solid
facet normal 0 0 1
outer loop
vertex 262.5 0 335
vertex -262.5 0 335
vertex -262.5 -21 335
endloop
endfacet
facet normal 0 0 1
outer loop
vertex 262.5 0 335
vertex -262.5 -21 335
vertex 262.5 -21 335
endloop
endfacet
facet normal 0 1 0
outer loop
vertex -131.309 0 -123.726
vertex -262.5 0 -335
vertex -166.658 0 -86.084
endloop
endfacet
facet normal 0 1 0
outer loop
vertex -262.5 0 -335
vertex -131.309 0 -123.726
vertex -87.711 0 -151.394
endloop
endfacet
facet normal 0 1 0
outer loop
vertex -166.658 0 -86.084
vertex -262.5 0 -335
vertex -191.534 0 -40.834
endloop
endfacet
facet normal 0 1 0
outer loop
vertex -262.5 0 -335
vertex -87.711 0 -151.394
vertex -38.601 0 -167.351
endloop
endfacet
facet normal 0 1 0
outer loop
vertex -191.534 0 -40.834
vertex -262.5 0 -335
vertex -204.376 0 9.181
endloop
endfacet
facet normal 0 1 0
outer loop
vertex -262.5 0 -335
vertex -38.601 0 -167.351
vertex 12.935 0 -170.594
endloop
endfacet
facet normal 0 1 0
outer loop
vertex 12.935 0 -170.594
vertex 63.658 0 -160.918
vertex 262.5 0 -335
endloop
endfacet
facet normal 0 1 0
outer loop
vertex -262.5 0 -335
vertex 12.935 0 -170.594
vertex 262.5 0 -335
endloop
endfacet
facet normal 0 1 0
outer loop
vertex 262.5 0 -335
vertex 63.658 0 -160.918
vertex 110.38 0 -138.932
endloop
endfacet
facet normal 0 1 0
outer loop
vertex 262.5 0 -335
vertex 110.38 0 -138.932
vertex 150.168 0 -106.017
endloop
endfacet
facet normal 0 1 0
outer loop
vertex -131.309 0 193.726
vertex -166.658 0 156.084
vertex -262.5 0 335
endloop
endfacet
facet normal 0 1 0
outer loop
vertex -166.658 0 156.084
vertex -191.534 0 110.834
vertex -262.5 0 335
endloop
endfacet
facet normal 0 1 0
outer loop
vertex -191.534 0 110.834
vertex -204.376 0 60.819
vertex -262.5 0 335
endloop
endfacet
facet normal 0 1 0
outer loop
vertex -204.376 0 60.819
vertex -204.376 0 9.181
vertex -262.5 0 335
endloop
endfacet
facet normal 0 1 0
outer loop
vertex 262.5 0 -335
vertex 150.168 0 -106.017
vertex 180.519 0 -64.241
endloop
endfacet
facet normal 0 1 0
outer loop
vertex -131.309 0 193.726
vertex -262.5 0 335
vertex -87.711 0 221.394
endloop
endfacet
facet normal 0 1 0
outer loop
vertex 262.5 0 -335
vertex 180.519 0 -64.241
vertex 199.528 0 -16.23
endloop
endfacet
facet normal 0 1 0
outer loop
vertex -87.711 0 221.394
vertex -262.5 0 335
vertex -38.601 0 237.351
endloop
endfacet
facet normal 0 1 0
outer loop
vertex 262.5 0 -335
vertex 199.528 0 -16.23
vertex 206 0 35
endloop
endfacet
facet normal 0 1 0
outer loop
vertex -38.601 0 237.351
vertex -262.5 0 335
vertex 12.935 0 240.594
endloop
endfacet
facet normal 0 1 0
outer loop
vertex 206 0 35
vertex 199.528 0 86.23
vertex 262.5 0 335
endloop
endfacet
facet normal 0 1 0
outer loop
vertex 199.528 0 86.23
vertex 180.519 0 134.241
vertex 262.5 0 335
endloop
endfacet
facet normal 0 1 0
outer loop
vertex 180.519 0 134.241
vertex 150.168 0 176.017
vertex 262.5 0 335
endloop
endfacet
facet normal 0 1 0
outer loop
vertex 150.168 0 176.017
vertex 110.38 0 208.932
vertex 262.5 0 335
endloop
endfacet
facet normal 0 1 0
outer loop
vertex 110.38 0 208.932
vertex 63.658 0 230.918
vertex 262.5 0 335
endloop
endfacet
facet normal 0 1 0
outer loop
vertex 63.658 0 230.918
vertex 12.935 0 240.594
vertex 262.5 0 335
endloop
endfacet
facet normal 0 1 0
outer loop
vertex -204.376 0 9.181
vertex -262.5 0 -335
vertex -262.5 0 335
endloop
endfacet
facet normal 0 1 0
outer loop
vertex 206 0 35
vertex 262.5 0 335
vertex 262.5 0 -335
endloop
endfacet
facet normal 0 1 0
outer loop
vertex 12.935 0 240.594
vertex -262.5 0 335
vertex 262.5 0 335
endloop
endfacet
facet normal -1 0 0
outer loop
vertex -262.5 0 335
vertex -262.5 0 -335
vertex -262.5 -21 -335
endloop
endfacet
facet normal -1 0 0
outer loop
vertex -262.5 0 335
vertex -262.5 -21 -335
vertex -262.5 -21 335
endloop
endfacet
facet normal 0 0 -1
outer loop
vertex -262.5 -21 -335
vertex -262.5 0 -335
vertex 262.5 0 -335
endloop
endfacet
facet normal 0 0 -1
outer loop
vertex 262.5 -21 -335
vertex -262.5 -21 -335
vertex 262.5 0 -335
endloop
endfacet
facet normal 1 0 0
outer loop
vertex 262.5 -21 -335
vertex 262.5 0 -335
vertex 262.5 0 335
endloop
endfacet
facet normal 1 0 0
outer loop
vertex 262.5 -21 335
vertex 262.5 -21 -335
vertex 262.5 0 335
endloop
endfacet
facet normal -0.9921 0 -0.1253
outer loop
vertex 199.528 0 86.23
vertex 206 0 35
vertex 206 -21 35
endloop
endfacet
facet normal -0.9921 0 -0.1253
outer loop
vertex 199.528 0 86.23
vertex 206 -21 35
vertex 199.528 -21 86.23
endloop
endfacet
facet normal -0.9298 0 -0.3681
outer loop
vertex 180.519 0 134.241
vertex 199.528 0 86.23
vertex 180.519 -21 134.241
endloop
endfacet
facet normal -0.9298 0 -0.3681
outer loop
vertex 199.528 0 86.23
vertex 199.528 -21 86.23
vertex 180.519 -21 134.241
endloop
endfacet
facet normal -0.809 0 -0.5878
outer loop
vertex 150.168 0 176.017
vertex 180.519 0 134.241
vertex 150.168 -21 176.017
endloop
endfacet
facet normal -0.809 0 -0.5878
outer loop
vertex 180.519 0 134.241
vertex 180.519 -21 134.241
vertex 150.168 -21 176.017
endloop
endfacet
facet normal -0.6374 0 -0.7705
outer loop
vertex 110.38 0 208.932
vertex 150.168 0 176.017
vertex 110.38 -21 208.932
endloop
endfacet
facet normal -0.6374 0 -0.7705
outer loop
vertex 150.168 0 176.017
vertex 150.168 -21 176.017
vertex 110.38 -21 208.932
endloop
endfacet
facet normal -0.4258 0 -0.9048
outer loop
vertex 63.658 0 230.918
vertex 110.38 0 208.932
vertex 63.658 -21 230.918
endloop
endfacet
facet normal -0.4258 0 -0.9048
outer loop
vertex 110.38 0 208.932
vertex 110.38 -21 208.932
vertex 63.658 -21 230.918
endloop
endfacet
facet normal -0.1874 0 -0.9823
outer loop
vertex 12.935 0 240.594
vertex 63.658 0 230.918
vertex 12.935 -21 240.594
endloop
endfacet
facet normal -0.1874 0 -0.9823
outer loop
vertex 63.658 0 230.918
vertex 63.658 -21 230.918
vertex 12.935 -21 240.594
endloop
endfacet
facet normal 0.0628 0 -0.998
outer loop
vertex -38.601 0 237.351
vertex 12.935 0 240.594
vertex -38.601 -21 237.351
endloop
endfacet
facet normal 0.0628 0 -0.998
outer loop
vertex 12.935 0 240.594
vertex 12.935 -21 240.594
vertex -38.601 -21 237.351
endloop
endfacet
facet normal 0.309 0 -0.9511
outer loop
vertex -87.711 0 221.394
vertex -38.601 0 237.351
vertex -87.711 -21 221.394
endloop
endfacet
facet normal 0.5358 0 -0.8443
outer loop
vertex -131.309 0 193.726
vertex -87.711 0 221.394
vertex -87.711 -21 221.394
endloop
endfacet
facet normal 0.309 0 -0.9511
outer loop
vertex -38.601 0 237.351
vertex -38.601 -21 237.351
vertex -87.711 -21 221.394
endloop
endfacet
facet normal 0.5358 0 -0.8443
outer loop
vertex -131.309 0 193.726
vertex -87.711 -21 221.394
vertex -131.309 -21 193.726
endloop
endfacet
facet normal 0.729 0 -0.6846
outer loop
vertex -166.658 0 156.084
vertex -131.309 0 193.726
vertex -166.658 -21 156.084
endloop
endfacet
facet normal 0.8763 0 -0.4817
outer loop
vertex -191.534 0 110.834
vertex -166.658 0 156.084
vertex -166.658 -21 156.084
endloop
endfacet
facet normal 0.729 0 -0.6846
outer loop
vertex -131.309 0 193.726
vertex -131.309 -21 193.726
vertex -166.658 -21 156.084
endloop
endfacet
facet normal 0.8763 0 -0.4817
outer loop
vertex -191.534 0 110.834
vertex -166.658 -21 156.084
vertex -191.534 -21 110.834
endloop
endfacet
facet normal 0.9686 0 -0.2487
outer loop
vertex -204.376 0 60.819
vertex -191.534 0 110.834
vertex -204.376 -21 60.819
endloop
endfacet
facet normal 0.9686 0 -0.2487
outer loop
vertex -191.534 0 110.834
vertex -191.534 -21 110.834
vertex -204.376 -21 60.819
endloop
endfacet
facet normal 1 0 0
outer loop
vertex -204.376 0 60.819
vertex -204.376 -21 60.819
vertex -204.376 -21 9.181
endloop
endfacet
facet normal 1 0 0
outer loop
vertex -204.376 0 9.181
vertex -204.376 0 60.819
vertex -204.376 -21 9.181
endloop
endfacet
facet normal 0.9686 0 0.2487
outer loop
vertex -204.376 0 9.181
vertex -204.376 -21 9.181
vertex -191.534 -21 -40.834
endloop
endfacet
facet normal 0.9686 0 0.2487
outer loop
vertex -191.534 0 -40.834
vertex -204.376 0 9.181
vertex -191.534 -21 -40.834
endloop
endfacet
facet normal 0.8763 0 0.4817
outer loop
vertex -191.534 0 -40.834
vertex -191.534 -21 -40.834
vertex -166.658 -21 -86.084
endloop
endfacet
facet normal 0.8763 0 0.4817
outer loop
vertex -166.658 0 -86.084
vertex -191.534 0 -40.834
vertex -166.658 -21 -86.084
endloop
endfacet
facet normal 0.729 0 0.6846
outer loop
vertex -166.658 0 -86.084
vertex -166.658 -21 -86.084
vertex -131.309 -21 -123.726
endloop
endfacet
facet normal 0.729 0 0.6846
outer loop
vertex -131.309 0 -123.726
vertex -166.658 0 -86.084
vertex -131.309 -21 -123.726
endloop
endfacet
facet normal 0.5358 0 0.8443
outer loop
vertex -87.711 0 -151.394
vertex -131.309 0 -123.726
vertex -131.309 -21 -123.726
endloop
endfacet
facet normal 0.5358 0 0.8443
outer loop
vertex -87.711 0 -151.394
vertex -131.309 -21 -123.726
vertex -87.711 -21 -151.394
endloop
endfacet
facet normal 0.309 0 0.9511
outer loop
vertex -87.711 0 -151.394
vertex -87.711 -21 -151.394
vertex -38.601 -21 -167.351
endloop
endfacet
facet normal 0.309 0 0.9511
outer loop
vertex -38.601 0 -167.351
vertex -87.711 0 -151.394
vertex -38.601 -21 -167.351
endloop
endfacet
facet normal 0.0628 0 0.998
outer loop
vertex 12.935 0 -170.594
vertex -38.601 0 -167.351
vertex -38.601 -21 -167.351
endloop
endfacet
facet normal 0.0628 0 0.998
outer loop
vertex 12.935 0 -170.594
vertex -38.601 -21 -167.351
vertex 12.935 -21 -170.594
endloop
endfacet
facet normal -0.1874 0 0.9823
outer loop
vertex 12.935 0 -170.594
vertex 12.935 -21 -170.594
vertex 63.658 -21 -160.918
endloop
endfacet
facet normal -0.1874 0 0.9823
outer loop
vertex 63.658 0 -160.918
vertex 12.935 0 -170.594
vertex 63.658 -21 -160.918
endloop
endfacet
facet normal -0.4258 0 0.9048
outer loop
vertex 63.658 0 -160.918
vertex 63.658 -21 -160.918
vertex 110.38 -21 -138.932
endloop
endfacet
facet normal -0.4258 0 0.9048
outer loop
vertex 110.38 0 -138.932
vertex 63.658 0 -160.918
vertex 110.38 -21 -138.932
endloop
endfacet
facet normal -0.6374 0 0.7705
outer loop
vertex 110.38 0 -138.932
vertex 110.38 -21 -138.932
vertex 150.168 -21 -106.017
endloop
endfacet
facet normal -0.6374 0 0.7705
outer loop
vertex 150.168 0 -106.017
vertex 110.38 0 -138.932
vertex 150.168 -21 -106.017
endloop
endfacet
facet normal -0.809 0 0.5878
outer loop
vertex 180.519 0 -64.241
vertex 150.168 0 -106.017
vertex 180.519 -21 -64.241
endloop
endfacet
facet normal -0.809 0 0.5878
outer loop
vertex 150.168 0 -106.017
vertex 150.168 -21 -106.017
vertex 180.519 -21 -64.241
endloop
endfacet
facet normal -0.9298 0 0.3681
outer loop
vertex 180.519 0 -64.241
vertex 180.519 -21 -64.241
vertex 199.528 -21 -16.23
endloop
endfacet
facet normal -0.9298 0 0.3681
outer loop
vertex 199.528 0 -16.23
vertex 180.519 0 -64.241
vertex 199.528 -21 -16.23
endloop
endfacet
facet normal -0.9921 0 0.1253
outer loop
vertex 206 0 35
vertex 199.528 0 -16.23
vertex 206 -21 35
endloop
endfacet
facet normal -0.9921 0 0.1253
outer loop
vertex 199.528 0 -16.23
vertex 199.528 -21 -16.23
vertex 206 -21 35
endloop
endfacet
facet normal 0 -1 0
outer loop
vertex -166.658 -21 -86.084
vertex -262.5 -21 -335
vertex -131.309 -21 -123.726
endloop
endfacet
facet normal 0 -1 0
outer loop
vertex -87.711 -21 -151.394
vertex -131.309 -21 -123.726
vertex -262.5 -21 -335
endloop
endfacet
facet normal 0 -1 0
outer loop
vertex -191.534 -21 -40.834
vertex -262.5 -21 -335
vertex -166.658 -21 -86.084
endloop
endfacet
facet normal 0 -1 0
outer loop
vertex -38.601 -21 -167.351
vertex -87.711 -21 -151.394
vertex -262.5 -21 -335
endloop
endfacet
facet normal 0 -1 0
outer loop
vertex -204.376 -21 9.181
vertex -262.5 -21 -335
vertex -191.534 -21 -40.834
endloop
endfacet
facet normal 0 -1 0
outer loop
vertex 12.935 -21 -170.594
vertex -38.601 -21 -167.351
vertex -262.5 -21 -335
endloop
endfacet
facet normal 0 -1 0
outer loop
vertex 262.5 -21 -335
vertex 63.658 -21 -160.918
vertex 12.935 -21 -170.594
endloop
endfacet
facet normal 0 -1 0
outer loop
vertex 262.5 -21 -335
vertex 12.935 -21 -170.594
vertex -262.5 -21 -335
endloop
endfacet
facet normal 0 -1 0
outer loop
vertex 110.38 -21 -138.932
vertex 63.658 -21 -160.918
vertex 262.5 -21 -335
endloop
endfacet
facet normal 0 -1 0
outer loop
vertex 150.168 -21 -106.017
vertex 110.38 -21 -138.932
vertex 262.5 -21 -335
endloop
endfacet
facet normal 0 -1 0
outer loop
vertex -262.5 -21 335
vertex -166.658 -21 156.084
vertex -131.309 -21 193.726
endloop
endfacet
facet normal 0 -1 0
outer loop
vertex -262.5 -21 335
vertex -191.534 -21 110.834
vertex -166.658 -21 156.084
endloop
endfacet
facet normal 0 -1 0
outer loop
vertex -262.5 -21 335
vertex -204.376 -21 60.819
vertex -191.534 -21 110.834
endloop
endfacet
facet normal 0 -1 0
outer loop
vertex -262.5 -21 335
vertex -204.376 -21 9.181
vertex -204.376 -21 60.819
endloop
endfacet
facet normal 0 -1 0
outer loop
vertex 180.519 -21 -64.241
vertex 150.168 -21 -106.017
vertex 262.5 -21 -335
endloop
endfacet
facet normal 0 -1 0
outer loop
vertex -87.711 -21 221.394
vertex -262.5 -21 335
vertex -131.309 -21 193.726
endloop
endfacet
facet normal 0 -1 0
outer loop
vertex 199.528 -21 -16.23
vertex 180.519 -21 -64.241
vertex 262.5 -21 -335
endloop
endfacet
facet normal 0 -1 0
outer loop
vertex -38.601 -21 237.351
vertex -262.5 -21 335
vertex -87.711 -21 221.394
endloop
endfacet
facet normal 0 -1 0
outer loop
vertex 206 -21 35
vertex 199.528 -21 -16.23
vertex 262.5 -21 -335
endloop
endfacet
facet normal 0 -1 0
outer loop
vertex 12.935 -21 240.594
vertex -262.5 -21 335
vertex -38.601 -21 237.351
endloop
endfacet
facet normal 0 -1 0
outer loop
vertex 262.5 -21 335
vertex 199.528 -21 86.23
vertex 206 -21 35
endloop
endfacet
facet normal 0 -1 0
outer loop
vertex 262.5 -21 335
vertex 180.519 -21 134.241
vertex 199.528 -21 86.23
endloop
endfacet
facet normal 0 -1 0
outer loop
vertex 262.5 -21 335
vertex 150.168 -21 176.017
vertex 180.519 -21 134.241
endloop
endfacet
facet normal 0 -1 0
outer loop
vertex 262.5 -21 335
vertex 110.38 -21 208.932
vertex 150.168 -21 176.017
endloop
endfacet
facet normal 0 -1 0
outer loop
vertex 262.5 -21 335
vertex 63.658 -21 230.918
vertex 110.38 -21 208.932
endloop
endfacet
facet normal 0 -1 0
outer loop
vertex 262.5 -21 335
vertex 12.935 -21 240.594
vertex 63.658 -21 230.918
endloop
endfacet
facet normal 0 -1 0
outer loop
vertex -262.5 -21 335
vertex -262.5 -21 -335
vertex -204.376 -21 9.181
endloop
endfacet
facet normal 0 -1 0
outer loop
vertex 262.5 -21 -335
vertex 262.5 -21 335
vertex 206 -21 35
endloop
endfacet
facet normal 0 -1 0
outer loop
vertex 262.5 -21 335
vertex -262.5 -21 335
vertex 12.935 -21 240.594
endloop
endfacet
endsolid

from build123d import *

# Parameters (mm, degrees)
F0_W     = 525
F0_H     = 670
F1_DEPTH = 21
F2_R     = 206
F3_DEPTH = 25


with BuildPart() as f1:
    # F0 (on Front) → F1 (new body)
    with BuildSketch(Plane.XZ):
        Rectangle(F0_W, F0_H)
    extrude(amount=F1_DEPTH)

    # F2 (on face) → F3 (cut)
    with BuildSketch(Plane.XZ.offset(21)):
        with Locations((0, 35)):
            Circle(F2_R)
    extrude(amount=-F3_DEPTH, mode=Mode.SUBTRACT)


solid = f1.part
